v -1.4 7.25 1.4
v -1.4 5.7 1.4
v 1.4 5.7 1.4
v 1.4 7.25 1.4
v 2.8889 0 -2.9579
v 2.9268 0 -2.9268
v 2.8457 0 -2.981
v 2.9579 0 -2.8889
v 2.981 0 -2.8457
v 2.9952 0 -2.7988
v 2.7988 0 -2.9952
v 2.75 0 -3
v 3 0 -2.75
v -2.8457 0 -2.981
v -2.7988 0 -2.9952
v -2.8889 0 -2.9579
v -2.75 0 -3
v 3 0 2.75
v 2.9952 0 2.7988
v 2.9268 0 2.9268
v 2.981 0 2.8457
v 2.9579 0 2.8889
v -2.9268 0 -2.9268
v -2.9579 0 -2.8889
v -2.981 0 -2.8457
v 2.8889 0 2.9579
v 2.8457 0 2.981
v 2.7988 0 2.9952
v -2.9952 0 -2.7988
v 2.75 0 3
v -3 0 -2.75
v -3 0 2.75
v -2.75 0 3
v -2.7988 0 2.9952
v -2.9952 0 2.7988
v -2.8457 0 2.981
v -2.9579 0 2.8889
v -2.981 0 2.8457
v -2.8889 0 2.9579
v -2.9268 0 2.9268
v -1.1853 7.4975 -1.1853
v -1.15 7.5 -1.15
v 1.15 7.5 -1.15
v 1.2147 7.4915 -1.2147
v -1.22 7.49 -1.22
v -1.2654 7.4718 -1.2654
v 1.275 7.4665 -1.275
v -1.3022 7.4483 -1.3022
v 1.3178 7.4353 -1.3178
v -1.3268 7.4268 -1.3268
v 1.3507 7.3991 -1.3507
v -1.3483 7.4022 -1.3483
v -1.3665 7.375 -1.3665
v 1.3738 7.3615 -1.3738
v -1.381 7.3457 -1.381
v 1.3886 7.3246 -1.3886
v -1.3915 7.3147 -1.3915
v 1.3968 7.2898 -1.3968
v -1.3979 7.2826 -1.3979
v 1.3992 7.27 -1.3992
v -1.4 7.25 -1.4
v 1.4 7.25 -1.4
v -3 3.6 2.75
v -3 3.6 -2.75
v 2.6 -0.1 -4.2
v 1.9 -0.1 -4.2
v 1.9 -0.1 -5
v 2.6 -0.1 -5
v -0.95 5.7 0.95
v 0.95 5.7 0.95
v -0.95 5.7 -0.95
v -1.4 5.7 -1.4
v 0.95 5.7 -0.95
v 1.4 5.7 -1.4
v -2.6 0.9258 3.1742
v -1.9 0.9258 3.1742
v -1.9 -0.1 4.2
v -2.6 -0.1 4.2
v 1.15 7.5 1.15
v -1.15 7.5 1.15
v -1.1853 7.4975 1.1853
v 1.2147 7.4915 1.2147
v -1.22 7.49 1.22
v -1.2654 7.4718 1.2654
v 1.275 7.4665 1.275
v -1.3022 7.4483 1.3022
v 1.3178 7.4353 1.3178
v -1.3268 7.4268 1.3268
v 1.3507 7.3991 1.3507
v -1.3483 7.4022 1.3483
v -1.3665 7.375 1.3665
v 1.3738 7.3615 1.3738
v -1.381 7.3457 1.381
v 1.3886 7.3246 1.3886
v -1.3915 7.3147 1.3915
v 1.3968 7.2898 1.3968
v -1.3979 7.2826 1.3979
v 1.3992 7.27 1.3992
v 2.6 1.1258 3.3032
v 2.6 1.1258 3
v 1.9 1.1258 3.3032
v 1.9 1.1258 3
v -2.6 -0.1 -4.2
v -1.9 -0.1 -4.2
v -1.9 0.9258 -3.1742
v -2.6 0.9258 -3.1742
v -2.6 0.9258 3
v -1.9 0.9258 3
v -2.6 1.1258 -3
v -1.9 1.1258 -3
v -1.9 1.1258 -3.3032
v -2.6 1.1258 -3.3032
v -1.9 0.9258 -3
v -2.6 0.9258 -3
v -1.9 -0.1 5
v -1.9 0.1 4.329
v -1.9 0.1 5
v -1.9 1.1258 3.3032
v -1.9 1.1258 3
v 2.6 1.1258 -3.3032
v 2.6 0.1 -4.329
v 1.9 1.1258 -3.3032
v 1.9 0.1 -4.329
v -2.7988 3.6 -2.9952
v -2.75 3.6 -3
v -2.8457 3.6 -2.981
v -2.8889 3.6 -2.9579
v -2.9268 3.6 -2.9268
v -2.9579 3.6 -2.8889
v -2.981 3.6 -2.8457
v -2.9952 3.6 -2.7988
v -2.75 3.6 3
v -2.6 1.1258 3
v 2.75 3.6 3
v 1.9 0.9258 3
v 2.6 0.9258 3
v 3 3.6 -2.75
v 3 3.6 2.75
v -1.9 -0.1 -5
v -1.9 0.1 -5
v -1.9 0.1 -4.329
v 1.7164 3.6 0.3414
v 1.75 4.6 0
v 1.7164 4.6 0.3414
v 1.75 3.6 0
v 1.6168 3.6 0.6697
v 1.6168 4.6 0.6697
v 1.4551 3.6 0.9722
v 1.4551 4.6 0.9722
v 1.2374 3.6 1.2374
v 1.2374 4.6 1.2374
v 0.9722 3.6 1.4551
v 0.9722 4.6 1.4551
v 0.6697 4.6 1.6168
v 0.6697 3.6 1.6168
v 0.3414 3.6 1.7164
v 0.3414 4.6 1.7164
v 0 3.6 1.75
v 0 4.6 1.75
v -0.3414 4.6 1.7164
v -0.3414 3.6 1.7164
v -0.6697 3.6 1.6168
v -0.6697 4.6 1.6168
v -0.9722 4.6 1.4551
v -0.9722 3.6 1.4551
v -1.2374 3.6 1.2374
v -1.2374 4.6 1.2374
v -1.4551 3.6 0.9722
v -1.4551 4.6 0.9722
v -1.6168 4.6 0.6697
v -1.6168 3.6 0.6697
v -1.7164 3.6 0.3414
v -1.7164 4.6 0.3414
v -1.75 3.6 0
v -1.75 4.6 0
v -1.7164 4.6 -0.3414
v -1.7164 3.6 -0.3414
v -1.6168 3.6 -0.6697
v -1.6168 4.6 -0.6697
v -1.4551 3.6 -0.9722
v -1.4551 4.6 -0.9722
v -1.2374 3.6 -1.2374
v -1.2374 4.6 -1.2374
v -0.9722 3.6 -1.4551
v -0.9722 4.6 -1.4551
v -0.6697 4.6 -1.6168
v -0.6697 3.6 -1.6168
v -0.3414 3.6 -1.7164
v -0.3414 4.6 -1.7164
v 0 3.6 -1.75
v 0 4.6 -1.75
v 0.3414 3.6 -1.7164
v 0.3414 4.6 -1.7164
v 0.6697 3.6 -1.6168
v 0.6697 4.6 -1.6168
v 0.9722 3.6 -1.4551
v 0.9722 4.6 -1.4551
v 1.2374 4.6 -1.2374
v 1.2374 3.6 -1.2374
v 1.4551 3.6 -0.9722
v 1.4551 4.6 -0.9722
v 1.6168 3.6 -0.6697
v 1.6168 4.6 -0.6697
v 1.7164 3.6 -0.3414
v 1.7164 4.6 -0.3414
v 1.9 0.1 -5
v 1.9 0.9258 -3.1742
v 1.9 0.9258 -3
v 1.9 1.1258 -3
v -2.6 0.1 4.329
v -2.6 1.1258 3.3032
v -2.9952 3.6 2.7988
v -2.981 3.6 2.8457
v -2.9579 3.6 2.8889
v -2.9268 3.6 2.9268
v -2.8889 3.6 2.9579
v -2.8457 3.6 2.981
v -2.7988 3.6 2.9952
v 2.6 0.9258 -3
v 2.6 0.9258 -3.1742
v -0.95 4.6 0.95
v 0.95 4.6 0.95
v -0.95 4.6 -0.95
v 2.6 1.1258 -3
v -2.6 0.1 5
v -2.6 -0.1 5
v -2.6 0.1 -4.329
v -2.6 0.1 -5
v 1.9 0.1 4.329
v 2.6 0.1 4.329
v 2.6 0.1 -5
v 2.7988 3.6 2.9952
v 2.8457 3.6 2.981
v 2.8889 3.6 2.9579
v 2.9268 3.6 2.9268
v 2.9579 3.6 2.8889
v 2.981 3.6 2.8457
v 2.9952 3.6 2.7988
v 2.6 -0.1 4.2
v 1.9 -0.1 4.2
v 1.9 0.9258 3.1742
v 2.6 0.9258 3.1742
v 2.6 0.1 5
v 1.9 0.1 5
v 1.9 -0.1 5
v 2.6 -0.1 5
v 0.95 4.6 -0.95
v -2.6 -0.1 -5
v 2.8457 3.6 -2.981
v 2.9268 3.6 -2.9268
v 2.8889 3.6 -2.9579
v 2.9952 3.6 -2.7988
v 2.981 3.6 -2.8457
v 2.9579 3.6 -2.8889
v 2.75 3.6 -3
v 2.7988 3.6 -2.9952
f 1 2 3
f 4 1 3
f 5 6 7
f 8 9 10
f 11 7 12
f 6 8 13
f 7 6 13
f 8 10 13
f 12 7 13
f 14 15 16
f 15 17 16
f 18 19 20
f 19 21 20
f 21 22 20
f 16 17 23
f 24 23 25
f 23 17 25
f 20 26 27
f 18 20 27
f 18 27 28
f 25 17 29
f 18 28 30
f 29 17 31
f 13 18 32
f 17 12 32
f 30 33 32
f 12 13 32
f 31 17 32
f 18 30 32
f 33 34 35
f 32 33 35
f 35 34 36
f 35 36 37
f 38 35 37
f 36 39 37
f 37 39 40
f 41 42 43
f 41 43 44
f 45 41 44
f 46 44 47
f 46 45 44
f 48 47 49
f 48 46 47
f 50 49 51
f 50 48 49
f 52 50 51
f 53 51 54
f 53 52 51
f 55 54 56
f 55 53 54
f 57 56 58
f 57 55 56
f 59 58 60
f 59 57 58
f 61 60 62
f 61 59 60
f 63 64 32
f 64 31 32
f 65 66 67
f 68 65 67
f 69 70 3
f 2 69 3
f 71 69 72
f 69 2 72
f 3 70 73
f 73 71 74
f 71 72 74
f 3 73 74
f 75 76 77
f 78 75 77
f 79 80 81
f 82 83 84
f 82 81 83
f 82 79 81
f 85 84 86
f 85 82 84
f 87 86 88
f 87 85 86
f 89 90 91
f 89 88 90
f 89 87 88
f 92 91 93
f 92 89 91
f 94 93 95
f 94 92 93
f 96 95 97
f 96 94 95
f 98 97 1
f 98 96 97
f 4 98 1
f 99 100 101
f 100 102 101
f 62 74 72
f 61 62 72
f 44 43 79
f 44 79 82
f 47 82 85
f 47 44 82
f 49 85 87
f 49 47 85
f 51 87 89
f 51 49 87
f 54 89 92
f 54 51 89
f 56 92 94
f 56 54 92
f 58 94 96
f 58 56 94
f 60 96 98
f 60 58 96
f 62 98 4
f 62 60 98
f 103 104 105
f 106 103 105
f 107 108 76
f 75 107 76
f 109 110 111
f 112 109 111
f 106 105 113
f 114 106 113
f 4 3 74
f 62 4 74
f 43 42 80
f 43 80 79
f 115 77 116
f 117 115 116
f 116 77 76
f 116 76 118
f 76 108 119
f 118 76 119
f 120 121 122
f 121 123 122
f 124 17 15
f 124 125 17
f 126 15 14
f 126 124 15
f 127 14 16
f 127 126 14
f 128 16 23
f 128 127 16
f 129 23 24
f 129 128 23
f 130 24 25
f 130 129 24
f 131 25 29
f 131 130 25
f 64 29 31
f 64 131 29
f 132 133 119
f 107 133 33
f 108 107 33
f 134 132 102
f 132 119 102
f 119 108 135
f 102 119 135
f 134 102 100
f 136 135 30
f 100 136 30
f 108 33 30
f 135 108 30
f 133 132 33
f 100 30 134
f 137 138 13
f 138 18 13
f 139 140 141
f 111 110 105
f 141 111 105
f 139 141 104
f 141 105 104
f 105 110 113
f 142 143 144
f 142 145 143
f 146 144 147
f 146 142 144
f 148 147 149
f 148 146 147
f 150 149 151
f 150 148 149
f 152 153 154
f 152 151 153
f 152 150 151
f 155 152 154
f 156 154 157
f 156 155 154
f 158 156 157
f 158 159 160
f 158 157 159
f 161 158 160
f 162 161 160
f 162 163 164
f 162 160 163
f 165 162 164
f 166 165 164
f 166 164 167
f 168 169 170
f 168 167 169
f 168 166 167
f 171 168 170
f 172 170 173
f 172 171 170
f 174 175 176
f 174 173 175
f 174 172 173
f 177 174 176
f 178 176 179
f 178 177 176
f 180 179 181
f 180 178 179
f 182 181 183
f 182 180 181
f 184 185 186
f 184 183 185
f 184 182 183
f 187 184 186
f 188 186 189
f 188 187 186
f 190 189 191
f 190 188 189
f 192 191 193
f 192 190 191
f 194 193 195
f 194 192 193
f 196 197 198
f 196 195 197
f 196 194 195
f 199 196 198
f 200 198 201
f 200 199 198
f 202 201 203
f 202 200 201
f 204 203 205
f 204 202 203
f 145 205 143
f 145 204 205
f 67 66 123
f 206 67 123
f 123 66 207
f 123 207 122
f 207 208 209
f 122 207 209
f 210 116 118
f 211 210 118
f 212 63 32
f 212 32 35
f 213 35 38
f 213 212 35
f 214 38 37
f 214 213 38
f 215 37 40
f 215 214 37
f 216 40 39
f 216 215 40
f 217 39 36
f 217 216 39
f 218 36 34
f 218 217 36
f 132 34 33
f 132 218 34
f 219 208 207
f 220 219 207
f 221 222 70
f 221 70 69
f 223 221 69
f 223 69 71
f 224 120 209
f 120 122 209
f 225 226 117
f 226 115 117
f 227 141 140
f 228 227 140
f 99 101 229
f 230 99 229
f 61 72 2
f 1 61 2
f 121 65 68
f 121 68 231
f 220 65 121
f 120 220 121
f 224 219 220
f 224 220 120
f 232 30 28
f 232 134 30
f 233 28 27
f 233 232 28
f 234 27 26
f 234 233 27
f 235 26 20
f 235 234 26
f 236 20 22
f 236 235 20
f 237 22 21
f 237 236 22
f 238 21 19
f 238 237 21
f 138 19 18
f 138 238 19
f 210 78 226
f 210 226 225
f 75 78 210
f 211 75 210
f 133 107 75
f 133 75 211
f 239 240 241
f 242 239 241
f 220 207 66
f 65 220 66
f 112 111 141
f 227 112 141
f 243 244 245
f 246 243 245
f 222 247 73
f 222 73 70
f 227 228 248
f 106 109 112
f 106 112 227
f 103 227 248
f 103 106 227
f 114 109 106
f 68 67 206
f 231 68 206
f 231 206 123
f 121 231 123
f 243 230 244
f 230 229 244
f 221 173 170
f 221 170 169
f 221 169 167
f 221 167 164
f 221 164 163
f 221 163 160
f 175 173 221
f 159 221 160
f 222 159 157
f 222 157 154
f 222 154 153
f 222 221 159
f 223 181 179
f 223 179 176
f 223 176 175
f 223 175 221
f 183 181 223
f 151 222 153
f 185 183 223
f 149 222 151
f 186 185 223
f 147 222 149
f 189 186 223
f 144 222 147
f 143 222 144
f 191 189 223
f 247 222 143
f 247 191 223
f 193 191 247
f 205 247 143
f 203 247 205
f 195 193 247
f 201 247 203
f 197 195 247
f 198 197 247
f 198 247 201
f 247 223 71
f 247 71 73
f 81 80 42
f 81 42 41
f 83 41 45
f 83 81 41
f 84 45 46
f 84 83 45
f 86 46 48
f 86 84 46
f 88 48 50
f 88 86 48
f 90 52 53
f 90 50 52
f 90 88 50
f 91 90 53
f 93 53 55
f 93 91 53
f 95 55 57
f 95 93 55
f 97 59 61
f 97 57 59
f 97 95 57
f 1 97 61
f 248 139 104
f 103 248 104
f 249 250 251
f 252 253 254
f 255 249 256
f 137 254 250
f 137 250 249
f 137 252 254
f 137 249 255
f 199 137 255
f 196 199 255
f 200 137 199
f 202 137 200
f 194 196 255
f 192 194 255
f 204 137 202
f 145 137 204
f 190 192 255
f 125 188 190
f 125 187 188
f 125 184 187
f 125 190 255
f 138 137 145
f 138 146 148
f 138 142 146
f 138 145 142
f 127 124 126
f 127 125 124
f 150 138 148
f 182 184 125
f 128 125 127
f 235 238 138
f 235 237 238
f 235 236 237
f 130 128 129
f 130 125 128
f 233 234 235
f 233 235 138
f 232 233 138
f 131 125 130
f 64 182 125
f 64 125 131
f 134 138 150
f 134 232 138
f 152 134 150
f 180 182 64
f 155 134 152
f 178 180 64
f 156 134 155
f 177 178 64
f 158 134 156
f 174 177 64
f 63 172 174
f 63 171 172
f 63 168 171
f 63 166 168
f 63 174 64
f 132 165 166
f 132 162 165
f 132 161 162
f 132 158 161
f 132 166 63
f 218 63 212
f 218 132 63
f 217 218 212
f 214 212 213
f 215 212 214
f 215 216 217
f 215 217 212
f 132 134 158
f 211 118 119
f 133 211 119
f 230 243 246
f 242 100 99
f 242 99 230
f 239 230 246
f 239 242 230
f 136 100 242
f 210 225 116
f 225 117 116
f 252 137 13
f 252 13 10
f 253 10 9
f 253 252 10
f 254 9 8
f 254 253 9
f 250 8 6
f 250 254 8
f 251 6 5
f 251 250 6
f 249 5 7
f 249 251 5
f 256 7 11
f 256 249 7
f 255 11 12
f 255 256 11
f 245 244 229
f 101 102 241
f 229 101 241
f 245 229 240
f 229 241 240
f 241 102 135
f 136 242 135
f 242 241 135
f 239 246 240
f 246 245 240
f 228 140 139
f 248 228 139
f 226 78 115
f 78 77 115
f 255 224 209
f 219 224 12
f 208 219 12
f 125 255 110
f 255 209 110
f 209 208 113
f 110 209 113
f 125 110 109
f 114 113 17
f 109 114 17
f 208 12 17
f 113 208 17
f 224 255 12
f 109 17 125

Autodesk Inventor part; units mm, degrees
ref_plane "XZ Plane" through (0, 0, 0) normal (0, 1, 0) x (-1, 0, 0)
ref_plane "XY Plane" through (0, 0, 0) normal (0, 0, 1) x (1, 0, 0)
sketch "Sketch1" plane through (0, 0, 0) normal (0, 1, 0) x (-1, 0, 0)
  line L0 (3, 3) -> (-3, 3)
  line L1 (-3, 3) -> (-3, -3)
  line L2 (-3, -3) -> (3, -3)
  line L3 (3, -3) -> (3, 3)
  point P0 (0, 0)
  dimension "d0" = 6
  dimension "d1" = 6
  dimension "d2" = 3
  dimension "d3" = 3
extrude "Extrusion1" add sketch "Sketch1" along normal blind 3.6
fillet "Fillet1" radius 0.25 4 edges at (3, 1.8, 3) (3, 1.8, -3) (-3, 1.8, 3) (-3, 1.8, -3)
sketch "Sketch2" plane through (0, 3.6, 0) normal (0, 1, 0) x (1, 0, 0)
  circle A0 centre (0, 0) radius 1.75
  dimension "d7" = 3.5
extrude "Extrusion2" add sketch "Sketch2" along normal blind 1
sketch "Sketch3" plane through (0, 4.6, 0) normal (0, 1, 0) x (1, 0, 0)
  line L0 (0.95, -0.95) -> (-0.95, -0.95)
  line L1 (-0.95, -0.95) -> (-0.95, 0.95)
  line L2 (-0.95, 0.95) -> (0.95, 0.95)
  line L3 (0.95, 0.95) -> (0.95, -0.95)
  point P0 (0, 0)
  dimension "d10" = 1.9
  dimension "d11" = 1.9
  dimension "d12" = 0.95
  dimension "d13" = 0.95
extrude "Extrusion3" add sketch "Sketch3" along normal blind 1.1
sketch "Sketch4" plane through (0, 5.7, 0) normal (0, 1, 0) x (1, 0, 0)
  line L0 (-1.4, -1.4) -> (1.4, -1.4)
  line L1 (1.4, -1.4) -> (1.4, 1.4)
  line L2 (1.4, 1.4) -> (-1.4, 1.4)
  line L3 (-1.4, 1.4) -> (-1.4, -1.4)
  point P0 (0, 0)
  dimension "d16" = 2.8
  dimension "d17" = 2.8
  dimension "d18" = 1.4
  dimension "d19" = 1.4
extrude "Extrusion4" add sketch "Sketch4" along normal blind 1.8
fillet "Fillet2" radius 0.25 4 edges at (1.4, 7.5, 0) (0, 7.5, 1.4) (-1.4, 7.5, 0) (0, 7.5, -1.4)
ref_plane "Work Plane1" through (2.25, 0, 0) normal (1, 0, 0) x (0, 1, 0)
sketch "Sketch5" plane through (2.25, 0, 0) normal (1, 0, 0) x (0, 1, 0)
  line L0 (1.1258, -3.3032) -> (1.1258, -2.4976)
  line L1 (1.1258, -2.4976) -> (0.9258, -2.4976)
  line L2 (0.9258, -2.4976) -> (0.9258, -3.1742)
  line L3 (0.9258, -3.1742) -> (-0.1, -4.2)
  line L4 (-0.1, -4.2) -> (-0.1, -5)
  line L5 (-0.1, -5) -> (0.1, -5)
  line L6 (0.1, -5) -> (0.1, -4.329)
  line L7 (0.1, -4.329) -> (1.1258, -3.3032)
  line L8 (0, 0) -> (-0.9994, 0)
  line L9 (0, 2.75) -> (0, -2.75) projected
  dimension "d24" = 4.2
  dimension "d25" = 5
  dimension "d26" = 0.1
  dimension "d27" = 0.2
  dimension "d28" = 0.2
  dimension "d29" = 45
  dimension "d30" = 45
extrude "Extrusion5" add sketch "Sketch5" along normal mid plane 0.7
mirror "Mirror1" about plane through (0, 0, 0) normal (1, 0, 0) of "Extrusion5"
mirror "Mirror2" about plane through (0, 0, 0) normal (0, 0, 1) of "Extrusion5", "Mirror1"
properties part number "TL3301SPF160QG_Tactile"
